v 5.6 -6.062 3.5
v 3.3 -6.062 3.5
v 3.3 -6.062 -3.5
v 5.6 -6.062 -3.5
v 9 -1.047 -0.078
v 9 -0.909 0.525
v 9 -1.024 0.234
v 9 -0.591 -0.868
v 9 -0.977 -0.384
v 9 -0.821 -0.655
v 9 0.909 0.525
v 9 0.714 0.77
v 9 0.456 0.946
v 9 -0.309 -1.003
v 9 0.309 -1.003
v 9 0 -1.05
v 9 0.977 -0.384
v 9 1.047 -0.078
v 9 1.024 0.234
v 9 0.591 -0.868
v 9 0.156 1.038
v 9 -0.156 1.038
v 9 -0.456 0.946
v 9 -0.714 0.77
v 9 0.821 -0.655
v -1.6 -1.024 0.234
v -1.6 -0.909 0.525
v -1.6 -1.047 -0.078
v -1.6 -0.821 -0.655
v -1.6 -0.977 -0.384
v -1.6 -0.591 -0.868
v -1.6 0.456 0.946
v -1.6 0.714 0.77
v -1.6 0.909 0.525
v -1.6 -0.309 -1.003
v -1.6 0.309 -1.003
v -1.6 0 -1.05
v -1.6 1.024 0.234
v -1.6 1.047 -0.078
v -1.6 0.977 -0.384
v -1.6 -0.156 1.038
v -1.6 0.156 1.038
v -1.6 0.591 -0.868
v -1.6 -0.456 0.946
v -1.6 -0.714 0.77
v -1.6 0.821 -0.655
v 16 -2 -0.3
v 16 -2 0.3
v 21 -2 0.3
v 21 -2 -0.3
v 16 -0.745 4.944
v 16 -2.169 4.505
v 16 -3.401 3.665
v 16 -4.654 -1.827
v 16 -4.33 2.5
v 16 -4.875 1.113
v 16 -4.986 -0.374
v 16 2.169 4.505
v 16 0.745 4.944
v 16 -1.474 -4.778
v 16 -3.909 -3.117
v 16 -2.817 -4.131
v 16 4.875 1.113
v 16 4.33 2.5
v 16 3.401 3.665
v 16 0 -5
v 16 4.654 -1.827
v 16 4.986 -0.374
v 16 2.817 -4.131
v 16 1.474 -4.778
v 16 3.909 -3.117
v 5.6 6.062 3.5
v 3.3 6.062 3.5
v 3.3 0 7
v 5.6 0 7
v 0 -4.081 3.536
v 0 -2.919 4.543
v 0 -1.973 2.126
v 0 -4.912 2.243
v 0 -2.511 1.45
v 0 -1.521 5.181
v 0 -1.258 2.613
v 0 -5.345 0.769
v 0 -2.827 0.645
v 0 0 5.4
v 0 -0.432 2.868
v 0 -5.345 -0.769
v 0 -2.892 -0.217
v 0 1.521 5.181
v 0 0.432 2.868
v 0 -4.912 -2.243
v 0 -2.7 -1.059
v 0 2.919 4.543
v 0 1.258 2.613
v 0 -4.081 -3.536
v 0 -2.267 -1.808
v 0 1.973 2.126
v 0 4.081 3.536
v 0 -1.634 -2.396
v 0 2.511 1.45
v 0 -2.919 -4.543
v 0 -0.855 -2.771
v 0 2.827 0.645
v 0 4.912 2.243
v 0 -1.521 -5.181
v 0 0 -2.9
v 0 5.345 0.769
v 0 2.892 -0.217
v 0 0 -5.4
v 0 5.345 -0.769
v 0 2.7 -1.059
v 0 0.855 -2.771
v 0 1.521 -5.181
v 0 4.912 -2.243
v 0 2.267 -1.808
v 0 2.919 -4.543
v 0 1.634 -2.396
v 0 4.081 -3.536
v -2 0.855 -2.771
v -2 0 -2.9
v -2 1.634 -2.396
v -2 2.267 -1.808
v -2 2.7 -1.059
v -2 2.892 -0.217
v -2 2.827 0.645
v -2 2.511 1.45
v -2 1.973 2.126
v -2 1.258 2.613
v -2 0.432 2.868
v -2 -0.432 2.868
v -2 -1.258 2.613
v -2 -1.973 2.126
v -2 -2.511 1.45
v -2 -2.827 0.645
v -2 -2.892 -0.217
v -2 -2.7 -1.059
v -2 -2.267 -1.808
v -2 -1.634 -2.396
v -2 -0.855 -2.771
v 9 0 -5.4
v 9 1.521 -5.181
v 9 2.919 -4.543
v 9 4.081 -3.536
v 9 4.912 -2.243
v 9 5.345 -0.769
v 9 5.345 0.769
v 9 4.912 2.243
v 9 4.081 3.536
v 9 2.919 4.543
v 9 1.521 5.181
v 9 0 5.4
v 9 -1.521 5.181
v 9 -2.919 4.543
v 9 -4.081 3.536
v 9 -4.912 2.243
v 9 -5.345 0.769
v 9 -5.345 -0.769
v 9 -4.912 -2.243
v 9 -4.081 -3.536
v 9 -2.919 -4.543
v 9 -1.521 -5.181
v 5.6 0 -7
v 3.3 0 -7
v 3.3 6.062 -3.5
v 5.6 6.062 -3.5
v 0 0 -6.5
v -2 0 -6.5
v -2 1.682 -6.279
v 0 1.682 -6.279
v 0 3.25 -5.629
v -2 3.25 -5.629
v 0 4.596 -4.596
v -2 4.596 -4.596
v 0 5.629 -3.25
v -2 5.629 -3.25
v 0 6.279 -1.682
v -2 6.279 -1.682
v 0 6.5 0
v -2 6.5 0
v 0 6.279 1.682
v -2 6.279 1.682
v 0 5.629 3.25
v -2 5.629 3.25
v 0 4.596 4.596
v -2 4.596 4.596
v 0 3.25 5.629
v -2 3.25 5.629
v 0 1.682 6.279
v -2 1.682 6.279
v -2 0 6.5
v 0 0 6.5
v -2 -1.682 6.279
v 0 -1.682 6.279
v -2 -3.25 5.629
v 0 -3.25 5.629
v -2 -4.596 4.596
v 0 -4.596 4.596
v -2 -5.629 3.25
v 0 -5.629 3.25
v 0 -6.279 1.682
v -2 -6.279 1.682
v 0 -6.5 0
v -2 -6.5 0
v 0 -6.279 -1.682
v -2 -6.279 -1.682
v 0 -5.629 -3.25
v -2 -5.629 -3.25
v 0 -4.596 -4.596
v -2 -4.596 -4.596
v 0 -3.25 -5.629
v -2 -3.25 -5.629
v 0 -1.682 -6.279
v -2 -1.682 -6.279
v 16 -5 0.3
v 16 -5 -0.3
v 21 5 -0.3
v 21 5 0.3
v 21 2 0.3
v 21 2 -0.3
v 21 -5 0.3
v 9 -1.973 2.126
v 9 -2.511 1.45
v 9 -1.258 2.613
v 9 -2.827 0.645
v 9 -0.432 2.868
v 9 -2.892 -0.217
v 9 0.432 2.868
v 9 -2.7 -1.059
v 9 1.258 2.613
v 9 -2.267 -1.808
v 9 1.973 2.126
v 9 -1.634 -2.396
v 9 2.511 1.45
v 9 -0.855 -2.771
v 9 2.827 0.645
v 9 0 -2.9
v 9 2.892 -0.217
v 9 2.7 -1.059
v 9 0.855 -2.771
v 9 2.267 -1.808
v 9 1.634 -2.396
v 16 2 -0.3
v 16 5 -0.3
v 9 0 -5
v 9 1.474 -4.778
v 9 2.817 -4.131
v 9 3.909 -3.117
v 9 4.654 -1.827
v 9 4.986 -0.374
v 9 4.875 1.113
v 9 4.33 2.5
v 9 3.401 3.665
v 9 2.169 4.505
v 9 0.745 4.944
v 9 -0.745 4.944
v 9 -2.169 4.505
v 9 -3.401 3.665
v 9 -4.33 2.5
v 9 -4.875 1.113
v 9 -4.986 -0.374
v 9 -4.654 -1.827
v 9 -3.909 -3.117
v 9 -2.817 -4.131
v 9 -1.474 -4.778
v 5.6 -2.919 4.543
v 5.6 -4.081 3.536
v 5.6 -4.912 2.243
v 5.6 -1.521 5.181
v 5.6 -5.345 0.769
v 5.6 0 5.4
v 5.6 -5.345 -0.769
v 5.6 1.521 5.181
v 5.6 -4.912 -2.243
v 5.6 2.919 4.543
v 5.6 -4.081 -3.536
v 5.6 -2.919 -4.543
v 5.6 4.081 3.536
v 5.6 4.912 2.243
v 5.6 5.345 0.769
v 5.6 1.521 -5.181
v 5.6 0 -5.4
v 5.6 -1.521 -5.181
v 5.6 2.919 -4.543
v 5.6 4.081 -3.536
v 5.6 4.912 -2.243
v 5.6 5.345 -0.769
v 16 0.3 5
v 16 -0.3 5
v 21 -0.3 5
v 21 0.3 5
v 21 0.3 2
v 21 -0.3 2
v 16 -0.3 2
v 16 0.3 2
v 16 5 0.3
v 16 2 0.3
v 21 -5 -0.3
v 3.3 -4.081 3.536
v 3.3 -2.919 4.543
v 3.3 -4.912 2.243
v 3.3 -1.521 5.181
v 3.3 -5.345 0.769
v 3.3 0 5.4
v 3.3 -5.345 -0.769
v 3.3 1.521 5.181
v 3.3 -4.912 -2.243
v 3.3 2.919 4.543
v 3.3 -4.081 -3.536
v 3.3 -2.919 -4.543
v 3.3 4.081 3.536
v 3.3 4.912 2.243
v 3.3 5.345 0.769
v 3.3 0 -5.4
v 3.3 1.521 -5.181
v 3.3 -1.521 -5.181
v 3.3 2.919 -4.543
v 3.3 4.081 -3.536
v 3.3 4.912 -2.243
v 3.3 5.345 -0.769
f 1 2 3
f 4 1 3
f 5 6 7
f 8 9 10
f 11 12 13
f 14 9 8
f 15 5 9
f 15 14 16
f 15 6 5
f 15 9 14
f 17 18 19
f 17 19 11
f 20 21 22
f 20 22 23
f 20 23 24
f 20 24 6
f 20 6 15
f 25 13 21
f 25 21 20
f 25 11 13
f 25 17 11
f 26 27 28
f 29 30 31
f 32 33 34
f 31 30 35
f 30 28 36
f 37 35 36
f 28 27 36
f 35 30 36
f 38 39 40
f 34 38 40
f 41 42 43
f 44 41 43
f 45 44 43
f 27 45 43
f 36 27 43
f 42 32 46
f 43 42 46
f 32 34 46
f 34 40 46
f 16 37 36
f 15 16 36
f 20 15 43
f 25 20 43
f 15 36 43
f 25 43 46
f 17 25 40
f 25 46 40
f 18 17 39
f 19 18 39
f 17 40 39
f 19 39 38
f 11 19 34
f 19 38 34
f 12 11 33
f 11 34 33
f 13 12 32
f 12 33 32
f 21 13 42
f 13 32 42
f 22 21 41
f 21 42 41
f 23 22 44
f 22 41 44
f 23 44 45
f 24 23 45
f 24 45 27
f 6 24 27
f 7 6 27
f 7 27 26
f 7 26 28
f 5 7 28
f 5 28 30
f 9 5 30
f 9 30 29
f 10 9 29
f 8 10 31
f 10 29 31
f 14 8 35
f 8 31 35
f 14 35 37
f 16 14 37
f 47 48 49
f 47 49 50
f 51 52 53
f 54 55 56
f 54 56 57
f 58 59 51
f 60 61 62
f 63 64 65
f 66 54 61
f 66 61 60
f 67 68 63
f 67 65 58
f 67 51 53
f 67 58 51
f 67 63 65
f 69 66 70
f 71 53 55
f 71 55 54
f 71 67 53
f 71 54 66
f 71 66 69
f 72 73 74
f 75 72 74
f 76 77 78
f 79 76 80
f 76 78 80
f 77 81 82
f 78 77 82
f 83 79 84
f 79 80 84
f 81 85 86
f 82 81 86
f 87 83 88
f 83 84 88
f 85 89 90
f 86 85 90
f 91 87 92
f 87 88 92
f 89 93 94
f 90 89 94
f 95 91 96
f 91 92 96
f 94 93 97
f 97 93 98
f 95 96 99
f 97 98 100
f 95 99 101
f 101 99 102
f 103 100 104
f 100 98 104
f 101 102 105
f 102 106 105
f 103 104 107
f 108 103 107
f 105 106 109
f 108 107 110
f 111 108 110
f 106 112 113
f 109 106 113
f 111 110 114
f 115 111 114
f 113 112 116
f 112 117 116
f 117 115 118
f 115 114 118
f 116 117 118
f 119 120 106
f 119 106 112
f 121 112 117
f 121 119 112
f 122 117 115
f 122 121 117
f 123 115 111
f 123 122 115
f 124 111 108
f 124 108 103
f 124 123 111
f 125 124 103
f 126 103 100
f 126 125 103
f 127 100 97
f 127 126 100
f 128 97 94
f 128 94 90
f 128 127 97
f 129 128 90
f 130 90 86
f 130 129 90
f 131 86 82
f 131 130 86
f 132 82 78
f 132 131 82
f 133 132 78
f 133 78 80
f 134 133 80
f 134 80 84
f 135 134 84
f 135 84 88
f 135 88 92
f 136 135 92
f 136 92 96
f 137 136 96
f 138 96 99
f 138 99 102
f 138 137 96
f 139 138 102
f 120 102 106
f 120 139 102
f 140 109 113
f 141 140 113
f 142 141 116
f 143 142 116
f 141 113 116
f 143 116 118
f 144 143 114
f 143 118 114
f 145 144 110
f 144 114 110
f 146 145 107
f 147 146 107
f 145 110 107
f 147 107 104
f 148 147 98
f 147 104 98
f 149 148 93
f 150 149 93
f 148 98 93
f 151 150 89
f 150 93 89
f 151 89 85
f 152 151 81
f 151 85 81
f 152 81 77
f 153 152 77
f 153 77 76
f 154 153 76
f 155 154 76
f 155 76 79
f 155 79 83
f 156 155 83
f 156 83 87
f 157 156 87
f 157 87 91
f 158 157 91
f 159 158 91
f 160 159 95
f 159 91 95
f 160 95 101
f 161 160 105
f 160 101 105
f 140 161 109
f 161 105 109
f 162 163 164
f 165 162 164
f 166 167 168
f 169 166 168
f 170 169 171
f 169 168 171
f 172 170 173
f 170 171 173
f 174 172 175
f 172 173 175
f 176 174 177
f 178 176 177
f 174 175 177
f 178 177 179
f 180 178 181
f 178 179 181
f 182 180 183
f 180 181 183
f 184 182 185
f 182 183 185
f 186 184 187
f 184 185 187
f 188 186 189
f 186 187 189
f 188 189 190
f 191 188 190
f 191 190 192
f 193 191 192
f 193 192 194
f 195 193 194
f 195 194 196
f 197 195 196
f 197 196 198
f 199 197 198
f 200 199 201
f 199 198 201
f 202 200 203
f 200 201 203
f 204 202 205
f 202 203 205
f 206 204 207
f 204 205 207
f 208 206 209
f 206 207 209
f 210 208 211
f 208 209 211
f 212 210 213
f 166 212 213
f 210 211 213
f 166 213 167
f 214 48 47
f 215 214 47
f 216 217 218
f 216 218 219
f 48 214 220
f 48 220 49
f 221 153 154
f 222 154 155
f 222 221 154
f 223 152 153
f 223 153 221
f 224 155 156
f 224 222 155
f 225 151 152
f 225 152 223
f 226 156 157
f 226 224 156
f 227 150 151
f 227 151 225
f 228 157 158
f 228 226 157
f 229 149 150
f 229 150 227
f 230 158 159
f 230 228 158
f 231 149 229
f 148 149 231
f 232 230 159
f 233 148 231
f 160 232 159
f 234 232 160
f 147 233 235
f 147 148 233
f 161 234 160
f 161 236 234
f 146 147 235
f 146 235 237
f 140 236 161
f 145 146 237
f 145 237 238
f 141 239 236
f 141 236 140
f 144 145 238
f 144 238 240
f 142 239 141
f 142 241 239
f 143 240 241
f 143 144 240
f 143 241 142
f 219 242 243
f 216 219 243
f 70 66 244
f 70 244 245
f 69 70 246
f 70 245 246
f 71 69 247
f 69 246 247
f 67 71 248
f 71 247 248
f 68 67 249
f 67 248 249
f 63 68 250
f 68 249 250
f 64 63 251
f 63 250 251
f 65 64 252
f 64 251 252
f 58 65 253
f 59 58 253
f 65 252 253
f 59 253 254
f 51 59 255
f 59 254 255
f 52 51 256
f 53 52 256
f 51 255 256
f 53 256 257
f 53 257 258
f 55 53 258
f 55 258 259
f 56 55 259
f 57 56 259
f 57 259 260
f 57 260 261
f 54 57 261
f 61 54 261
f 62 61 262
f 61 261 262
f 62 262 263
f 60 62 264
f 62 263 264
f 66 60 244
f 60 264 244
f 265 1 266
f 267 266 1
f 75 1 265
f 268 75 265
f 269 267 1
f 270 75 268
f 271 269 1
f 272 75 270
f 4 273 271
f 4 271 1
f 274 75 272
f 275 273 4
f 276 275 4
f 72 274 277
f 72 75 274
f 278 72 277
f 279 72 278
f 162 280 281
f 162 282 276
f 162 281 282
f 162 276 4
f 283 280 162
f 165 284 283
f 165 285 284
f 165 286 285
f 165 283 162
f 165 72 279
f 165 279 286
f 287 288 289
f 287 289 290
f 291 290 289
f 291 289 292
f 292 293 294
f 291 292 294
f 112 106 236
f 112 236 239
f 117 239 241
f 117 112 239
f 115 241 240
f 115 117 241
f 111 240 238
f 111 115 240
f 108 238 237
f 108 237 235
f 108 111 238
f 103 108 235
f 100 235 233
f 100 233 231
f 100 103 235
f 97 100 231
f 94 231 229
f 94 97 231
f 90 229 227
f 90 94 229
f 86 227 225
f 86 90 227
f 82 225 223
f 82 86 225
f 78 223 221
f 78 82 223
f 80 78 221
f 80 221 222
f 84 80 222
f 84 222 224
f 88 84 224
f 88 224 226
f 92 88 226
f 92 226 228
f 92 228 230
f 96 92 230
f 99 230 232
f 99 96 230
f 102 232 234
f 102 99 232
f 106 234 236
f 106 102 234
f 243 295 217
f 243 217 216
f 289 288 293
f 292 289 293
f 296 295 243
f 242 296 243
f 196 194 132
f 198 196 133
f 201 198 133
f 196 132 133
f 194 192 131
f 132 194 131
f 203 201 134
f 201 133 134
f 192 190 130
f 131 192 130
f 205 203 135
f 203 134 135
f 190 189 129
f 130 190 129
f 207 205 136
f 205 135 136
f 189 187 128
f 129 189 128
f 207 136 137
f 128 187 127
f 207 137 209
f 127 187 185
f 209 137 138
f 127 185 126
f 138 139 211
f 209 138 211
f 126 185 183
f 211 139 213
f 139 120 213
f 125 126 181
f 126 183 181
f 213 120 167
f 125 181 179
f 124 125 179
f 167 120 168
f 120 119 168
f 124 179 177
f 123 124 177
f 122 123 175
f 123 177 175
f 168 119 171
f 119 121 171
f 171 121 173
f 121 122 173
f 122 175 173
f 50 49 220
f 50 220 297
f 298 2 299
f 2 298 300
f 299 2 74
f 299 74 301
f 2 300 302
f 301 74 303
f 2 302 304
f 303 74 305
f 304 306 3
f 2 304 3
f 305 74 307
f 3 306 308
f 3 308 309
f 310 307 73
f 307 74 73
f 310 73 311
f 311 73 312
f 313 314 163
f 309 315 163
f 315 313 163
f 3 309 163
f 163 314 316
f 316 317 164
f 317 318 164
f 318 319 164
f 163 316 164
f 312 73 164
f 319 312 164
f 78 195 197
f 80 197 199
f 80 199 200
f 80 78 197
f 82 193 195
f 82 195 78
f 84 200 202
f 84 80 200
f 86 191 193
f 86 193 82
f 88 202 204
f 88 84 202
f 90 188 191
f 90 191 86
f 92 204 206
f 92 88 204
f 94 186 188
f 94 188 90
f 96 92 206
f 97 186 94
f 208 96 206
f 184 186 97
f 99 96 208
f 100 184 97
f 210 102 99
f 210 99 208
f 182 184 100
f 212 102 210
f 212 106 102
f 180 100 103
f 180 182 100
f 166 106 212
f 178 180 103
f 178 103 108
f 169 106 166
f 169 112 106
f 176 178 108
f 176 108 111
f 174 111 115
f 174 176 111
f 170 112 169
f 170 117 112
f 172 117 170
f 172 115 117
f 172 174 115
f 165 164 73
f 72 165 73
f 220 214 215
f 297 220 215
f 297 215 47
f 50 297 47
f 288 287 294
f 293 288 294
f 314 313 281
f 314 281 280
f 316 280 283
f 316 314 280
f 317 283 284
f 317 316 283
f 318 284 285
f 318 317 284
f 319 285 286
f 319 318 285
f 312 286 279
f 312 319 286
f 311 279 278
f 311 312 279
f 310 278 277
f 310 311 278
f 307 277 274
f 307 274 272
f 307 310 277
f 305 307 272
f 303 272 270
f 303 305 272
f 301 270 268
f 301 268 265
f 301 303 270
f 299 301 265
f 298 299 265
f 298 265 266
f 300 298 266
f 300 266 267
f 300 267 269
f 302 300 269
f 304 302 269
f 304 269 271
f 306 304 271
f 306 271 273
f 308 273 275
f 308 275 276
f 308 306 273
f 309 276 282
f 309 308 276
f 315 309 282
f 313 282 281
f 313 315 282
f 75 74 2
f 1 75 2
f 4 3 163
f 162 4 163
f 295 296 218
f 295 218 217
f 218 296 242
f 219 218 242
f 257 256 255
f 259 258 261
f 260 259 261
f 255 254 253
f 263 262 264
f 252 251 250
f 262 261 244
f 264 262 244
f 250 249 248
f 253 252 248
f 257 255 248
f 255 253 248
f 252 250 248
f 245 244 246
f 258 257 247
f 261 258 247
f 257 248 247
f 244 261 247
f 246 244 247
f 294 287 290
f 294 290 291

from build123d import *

# Parameters (mm, degrees)
FRONT_START          = -2
SK_FRONT_COLLAR_R    = 6.5
SK_FRONT_COLLAR_R_2  = 2.9
FRONT_COLLAR_DEPTH   = 2
CENTRE_START         = -1.6
SK_CENTRE_PIN_R      = 1.05
CENTRE_PIN_DEPTH     = 10.6
SK_THREADED_BODY_R   = 5.4
SK_THREADED_BODY_R_2 = 2.9
THREADED_BODY_DEPTH  = 9
PANEL_START          = 3.3
SK_PANEL_NUT_R       = 5.4
PANEL_NUT_DEPTH      = 2.3
REAR_START           = 9
SK_REAR_HOUSING_R    = 5
REAR_HOUSING_DEPTH   = 7
SOLDER_START         = 16
SK_SOLDER_TABS_W     = 0.6
SK_SOLDER_TABS_H     = 3
SOLDER_TABS_DEPTH    = 5
SOLDER_TABS_2_DEPTH  = 5
SK_SOLDER_TABS_W_2   = 3
SK_SOLDER_TABS_H_2   = 0.6
SOLDER_TABS_3_DEPTH  = 5


with BuildPart() as part:
    # SK Front collar → Front collar (new body)
    with BuildSketch(Plane(origin=(0, 0, 0), x_dir=(0, 0, -1), z_dir=(1, 0, 0)).offset(FRONT_START)):
        Circle(SK_FRONT_COLLAR_R)
        Circle(SK_FRONT_COLLAR_R_2, mode=Mode.SUBTRACT)
    extrude(amount=FRONT_COLLAR_DEPTH)


with BuildPart() as body_2:
    # SK Centre pin → Centre pin (new body)
    with BuildSketch(Plane(origin=(0, 0, 0), x_dir=(0, 0, -1), z_dir=(1, 0, 0)).offset(CENTRE_START)):
        Circle(SK_CENTRE_PIN_R)
    extrude(amount=CENTRE_PIN_DEPTH)


with BuildPart() as body_3:
    # SK Threaded body → Threaded body (new body)
    with BuildSketch(Plane(origin=(0, 0, 0), x_dir=(0, 0, -1), z_dir=(1, 0, 0))):
        Circle(SK_THREADED_BODY_R)
        Circle(SK_THREADED_BODY_R_2, mode=Mode.SUBTRACT)
    extrude(amount=THREADED_BODY_DEPTH)


with BuildPart() as body_4:
    # SK Panel nut → Panel nut (new body)
    with BuildSketch(Plane(origin=(0, 0, 0), x_dir=(0, 0, -1), z_dir=(1, 0, 0)).offset(PANEL_START)):
        Polygon((7, 0), (3.5, 6.062177826), (-3.5, 6.062177826), (-7, 0), (-3.5, -6.062177826), (3.5, -6.062177826), align=None)
        Circle(SK_PANEL_NUT_R, mode=Mode.SUBTRACT)
    extrude(amount=PANEL_NUT_DEPTH)


with BuildPart() as body_5:
    # SK Rear housing → Rear housing (new body)
    with BuildSketch(Plane(origin=(0, 0, 0), x_dir=(0, 0, -1), z_dir=(1, 0, 0)).offset(REAR_START)):
        Circle(SK_REAR_HOUSING_R)
    extrude(amount=REAR_HOUSING_DEPTH)


with BuildPart() as body_6:
    # SK Solder tabs → Solder tabs (new body)
    with BuildSketch(Plane(origin=(0, 0, 0), x_dir=(0, 0, -1), z_dir=(1, 0, 0)).offset(SOLDER_START)):
        with Locations((0, 3.5)):
            Rectangle(SK_SOLDER_TABS_W, SK_SOLDER_TABS_H)
    extrude(amount=SOLDER_TABS_DEPTH)


with BuildPart() as body_7:
    # SK Solder tabs → Solder tabs 2 (new body)
    with BuildSketch(Plane(origin=(0, 0, 0), x_dir=(0, 0, -1), z_dir=(1, 0, 0)).offset(SOLDER_START)):
        with Locations((0, -3.5)):
            Rectangle(SK_SOLDER_TABS_W, SK_SOLDER_TABS_H)
    extrude(amount=SOLDER_TABS_2_DEPTH)


with BuildPart() as body_8:
    # SK Solder tabs → Solder tabs 3 (new body)
    with BuildSketch(Plane(origin=(0, 0, 0), x_dir=(0, 0, -1), z_dir=(1, 0, 0)).offset(SOLDER_START)):
        with Locations((-3.5, 0)):
            Rectangle(SK_SOLDER_TABS_W_2, SK_SOLDER_TABS_H_2)
    extrude(amount=SOLDER_TABS_3_DEPTH)


solid = Compound([part.part, body_2.part, body_3.part, body_4.part, body_5.part, body_6.part, body_7.part, body_8.part])
